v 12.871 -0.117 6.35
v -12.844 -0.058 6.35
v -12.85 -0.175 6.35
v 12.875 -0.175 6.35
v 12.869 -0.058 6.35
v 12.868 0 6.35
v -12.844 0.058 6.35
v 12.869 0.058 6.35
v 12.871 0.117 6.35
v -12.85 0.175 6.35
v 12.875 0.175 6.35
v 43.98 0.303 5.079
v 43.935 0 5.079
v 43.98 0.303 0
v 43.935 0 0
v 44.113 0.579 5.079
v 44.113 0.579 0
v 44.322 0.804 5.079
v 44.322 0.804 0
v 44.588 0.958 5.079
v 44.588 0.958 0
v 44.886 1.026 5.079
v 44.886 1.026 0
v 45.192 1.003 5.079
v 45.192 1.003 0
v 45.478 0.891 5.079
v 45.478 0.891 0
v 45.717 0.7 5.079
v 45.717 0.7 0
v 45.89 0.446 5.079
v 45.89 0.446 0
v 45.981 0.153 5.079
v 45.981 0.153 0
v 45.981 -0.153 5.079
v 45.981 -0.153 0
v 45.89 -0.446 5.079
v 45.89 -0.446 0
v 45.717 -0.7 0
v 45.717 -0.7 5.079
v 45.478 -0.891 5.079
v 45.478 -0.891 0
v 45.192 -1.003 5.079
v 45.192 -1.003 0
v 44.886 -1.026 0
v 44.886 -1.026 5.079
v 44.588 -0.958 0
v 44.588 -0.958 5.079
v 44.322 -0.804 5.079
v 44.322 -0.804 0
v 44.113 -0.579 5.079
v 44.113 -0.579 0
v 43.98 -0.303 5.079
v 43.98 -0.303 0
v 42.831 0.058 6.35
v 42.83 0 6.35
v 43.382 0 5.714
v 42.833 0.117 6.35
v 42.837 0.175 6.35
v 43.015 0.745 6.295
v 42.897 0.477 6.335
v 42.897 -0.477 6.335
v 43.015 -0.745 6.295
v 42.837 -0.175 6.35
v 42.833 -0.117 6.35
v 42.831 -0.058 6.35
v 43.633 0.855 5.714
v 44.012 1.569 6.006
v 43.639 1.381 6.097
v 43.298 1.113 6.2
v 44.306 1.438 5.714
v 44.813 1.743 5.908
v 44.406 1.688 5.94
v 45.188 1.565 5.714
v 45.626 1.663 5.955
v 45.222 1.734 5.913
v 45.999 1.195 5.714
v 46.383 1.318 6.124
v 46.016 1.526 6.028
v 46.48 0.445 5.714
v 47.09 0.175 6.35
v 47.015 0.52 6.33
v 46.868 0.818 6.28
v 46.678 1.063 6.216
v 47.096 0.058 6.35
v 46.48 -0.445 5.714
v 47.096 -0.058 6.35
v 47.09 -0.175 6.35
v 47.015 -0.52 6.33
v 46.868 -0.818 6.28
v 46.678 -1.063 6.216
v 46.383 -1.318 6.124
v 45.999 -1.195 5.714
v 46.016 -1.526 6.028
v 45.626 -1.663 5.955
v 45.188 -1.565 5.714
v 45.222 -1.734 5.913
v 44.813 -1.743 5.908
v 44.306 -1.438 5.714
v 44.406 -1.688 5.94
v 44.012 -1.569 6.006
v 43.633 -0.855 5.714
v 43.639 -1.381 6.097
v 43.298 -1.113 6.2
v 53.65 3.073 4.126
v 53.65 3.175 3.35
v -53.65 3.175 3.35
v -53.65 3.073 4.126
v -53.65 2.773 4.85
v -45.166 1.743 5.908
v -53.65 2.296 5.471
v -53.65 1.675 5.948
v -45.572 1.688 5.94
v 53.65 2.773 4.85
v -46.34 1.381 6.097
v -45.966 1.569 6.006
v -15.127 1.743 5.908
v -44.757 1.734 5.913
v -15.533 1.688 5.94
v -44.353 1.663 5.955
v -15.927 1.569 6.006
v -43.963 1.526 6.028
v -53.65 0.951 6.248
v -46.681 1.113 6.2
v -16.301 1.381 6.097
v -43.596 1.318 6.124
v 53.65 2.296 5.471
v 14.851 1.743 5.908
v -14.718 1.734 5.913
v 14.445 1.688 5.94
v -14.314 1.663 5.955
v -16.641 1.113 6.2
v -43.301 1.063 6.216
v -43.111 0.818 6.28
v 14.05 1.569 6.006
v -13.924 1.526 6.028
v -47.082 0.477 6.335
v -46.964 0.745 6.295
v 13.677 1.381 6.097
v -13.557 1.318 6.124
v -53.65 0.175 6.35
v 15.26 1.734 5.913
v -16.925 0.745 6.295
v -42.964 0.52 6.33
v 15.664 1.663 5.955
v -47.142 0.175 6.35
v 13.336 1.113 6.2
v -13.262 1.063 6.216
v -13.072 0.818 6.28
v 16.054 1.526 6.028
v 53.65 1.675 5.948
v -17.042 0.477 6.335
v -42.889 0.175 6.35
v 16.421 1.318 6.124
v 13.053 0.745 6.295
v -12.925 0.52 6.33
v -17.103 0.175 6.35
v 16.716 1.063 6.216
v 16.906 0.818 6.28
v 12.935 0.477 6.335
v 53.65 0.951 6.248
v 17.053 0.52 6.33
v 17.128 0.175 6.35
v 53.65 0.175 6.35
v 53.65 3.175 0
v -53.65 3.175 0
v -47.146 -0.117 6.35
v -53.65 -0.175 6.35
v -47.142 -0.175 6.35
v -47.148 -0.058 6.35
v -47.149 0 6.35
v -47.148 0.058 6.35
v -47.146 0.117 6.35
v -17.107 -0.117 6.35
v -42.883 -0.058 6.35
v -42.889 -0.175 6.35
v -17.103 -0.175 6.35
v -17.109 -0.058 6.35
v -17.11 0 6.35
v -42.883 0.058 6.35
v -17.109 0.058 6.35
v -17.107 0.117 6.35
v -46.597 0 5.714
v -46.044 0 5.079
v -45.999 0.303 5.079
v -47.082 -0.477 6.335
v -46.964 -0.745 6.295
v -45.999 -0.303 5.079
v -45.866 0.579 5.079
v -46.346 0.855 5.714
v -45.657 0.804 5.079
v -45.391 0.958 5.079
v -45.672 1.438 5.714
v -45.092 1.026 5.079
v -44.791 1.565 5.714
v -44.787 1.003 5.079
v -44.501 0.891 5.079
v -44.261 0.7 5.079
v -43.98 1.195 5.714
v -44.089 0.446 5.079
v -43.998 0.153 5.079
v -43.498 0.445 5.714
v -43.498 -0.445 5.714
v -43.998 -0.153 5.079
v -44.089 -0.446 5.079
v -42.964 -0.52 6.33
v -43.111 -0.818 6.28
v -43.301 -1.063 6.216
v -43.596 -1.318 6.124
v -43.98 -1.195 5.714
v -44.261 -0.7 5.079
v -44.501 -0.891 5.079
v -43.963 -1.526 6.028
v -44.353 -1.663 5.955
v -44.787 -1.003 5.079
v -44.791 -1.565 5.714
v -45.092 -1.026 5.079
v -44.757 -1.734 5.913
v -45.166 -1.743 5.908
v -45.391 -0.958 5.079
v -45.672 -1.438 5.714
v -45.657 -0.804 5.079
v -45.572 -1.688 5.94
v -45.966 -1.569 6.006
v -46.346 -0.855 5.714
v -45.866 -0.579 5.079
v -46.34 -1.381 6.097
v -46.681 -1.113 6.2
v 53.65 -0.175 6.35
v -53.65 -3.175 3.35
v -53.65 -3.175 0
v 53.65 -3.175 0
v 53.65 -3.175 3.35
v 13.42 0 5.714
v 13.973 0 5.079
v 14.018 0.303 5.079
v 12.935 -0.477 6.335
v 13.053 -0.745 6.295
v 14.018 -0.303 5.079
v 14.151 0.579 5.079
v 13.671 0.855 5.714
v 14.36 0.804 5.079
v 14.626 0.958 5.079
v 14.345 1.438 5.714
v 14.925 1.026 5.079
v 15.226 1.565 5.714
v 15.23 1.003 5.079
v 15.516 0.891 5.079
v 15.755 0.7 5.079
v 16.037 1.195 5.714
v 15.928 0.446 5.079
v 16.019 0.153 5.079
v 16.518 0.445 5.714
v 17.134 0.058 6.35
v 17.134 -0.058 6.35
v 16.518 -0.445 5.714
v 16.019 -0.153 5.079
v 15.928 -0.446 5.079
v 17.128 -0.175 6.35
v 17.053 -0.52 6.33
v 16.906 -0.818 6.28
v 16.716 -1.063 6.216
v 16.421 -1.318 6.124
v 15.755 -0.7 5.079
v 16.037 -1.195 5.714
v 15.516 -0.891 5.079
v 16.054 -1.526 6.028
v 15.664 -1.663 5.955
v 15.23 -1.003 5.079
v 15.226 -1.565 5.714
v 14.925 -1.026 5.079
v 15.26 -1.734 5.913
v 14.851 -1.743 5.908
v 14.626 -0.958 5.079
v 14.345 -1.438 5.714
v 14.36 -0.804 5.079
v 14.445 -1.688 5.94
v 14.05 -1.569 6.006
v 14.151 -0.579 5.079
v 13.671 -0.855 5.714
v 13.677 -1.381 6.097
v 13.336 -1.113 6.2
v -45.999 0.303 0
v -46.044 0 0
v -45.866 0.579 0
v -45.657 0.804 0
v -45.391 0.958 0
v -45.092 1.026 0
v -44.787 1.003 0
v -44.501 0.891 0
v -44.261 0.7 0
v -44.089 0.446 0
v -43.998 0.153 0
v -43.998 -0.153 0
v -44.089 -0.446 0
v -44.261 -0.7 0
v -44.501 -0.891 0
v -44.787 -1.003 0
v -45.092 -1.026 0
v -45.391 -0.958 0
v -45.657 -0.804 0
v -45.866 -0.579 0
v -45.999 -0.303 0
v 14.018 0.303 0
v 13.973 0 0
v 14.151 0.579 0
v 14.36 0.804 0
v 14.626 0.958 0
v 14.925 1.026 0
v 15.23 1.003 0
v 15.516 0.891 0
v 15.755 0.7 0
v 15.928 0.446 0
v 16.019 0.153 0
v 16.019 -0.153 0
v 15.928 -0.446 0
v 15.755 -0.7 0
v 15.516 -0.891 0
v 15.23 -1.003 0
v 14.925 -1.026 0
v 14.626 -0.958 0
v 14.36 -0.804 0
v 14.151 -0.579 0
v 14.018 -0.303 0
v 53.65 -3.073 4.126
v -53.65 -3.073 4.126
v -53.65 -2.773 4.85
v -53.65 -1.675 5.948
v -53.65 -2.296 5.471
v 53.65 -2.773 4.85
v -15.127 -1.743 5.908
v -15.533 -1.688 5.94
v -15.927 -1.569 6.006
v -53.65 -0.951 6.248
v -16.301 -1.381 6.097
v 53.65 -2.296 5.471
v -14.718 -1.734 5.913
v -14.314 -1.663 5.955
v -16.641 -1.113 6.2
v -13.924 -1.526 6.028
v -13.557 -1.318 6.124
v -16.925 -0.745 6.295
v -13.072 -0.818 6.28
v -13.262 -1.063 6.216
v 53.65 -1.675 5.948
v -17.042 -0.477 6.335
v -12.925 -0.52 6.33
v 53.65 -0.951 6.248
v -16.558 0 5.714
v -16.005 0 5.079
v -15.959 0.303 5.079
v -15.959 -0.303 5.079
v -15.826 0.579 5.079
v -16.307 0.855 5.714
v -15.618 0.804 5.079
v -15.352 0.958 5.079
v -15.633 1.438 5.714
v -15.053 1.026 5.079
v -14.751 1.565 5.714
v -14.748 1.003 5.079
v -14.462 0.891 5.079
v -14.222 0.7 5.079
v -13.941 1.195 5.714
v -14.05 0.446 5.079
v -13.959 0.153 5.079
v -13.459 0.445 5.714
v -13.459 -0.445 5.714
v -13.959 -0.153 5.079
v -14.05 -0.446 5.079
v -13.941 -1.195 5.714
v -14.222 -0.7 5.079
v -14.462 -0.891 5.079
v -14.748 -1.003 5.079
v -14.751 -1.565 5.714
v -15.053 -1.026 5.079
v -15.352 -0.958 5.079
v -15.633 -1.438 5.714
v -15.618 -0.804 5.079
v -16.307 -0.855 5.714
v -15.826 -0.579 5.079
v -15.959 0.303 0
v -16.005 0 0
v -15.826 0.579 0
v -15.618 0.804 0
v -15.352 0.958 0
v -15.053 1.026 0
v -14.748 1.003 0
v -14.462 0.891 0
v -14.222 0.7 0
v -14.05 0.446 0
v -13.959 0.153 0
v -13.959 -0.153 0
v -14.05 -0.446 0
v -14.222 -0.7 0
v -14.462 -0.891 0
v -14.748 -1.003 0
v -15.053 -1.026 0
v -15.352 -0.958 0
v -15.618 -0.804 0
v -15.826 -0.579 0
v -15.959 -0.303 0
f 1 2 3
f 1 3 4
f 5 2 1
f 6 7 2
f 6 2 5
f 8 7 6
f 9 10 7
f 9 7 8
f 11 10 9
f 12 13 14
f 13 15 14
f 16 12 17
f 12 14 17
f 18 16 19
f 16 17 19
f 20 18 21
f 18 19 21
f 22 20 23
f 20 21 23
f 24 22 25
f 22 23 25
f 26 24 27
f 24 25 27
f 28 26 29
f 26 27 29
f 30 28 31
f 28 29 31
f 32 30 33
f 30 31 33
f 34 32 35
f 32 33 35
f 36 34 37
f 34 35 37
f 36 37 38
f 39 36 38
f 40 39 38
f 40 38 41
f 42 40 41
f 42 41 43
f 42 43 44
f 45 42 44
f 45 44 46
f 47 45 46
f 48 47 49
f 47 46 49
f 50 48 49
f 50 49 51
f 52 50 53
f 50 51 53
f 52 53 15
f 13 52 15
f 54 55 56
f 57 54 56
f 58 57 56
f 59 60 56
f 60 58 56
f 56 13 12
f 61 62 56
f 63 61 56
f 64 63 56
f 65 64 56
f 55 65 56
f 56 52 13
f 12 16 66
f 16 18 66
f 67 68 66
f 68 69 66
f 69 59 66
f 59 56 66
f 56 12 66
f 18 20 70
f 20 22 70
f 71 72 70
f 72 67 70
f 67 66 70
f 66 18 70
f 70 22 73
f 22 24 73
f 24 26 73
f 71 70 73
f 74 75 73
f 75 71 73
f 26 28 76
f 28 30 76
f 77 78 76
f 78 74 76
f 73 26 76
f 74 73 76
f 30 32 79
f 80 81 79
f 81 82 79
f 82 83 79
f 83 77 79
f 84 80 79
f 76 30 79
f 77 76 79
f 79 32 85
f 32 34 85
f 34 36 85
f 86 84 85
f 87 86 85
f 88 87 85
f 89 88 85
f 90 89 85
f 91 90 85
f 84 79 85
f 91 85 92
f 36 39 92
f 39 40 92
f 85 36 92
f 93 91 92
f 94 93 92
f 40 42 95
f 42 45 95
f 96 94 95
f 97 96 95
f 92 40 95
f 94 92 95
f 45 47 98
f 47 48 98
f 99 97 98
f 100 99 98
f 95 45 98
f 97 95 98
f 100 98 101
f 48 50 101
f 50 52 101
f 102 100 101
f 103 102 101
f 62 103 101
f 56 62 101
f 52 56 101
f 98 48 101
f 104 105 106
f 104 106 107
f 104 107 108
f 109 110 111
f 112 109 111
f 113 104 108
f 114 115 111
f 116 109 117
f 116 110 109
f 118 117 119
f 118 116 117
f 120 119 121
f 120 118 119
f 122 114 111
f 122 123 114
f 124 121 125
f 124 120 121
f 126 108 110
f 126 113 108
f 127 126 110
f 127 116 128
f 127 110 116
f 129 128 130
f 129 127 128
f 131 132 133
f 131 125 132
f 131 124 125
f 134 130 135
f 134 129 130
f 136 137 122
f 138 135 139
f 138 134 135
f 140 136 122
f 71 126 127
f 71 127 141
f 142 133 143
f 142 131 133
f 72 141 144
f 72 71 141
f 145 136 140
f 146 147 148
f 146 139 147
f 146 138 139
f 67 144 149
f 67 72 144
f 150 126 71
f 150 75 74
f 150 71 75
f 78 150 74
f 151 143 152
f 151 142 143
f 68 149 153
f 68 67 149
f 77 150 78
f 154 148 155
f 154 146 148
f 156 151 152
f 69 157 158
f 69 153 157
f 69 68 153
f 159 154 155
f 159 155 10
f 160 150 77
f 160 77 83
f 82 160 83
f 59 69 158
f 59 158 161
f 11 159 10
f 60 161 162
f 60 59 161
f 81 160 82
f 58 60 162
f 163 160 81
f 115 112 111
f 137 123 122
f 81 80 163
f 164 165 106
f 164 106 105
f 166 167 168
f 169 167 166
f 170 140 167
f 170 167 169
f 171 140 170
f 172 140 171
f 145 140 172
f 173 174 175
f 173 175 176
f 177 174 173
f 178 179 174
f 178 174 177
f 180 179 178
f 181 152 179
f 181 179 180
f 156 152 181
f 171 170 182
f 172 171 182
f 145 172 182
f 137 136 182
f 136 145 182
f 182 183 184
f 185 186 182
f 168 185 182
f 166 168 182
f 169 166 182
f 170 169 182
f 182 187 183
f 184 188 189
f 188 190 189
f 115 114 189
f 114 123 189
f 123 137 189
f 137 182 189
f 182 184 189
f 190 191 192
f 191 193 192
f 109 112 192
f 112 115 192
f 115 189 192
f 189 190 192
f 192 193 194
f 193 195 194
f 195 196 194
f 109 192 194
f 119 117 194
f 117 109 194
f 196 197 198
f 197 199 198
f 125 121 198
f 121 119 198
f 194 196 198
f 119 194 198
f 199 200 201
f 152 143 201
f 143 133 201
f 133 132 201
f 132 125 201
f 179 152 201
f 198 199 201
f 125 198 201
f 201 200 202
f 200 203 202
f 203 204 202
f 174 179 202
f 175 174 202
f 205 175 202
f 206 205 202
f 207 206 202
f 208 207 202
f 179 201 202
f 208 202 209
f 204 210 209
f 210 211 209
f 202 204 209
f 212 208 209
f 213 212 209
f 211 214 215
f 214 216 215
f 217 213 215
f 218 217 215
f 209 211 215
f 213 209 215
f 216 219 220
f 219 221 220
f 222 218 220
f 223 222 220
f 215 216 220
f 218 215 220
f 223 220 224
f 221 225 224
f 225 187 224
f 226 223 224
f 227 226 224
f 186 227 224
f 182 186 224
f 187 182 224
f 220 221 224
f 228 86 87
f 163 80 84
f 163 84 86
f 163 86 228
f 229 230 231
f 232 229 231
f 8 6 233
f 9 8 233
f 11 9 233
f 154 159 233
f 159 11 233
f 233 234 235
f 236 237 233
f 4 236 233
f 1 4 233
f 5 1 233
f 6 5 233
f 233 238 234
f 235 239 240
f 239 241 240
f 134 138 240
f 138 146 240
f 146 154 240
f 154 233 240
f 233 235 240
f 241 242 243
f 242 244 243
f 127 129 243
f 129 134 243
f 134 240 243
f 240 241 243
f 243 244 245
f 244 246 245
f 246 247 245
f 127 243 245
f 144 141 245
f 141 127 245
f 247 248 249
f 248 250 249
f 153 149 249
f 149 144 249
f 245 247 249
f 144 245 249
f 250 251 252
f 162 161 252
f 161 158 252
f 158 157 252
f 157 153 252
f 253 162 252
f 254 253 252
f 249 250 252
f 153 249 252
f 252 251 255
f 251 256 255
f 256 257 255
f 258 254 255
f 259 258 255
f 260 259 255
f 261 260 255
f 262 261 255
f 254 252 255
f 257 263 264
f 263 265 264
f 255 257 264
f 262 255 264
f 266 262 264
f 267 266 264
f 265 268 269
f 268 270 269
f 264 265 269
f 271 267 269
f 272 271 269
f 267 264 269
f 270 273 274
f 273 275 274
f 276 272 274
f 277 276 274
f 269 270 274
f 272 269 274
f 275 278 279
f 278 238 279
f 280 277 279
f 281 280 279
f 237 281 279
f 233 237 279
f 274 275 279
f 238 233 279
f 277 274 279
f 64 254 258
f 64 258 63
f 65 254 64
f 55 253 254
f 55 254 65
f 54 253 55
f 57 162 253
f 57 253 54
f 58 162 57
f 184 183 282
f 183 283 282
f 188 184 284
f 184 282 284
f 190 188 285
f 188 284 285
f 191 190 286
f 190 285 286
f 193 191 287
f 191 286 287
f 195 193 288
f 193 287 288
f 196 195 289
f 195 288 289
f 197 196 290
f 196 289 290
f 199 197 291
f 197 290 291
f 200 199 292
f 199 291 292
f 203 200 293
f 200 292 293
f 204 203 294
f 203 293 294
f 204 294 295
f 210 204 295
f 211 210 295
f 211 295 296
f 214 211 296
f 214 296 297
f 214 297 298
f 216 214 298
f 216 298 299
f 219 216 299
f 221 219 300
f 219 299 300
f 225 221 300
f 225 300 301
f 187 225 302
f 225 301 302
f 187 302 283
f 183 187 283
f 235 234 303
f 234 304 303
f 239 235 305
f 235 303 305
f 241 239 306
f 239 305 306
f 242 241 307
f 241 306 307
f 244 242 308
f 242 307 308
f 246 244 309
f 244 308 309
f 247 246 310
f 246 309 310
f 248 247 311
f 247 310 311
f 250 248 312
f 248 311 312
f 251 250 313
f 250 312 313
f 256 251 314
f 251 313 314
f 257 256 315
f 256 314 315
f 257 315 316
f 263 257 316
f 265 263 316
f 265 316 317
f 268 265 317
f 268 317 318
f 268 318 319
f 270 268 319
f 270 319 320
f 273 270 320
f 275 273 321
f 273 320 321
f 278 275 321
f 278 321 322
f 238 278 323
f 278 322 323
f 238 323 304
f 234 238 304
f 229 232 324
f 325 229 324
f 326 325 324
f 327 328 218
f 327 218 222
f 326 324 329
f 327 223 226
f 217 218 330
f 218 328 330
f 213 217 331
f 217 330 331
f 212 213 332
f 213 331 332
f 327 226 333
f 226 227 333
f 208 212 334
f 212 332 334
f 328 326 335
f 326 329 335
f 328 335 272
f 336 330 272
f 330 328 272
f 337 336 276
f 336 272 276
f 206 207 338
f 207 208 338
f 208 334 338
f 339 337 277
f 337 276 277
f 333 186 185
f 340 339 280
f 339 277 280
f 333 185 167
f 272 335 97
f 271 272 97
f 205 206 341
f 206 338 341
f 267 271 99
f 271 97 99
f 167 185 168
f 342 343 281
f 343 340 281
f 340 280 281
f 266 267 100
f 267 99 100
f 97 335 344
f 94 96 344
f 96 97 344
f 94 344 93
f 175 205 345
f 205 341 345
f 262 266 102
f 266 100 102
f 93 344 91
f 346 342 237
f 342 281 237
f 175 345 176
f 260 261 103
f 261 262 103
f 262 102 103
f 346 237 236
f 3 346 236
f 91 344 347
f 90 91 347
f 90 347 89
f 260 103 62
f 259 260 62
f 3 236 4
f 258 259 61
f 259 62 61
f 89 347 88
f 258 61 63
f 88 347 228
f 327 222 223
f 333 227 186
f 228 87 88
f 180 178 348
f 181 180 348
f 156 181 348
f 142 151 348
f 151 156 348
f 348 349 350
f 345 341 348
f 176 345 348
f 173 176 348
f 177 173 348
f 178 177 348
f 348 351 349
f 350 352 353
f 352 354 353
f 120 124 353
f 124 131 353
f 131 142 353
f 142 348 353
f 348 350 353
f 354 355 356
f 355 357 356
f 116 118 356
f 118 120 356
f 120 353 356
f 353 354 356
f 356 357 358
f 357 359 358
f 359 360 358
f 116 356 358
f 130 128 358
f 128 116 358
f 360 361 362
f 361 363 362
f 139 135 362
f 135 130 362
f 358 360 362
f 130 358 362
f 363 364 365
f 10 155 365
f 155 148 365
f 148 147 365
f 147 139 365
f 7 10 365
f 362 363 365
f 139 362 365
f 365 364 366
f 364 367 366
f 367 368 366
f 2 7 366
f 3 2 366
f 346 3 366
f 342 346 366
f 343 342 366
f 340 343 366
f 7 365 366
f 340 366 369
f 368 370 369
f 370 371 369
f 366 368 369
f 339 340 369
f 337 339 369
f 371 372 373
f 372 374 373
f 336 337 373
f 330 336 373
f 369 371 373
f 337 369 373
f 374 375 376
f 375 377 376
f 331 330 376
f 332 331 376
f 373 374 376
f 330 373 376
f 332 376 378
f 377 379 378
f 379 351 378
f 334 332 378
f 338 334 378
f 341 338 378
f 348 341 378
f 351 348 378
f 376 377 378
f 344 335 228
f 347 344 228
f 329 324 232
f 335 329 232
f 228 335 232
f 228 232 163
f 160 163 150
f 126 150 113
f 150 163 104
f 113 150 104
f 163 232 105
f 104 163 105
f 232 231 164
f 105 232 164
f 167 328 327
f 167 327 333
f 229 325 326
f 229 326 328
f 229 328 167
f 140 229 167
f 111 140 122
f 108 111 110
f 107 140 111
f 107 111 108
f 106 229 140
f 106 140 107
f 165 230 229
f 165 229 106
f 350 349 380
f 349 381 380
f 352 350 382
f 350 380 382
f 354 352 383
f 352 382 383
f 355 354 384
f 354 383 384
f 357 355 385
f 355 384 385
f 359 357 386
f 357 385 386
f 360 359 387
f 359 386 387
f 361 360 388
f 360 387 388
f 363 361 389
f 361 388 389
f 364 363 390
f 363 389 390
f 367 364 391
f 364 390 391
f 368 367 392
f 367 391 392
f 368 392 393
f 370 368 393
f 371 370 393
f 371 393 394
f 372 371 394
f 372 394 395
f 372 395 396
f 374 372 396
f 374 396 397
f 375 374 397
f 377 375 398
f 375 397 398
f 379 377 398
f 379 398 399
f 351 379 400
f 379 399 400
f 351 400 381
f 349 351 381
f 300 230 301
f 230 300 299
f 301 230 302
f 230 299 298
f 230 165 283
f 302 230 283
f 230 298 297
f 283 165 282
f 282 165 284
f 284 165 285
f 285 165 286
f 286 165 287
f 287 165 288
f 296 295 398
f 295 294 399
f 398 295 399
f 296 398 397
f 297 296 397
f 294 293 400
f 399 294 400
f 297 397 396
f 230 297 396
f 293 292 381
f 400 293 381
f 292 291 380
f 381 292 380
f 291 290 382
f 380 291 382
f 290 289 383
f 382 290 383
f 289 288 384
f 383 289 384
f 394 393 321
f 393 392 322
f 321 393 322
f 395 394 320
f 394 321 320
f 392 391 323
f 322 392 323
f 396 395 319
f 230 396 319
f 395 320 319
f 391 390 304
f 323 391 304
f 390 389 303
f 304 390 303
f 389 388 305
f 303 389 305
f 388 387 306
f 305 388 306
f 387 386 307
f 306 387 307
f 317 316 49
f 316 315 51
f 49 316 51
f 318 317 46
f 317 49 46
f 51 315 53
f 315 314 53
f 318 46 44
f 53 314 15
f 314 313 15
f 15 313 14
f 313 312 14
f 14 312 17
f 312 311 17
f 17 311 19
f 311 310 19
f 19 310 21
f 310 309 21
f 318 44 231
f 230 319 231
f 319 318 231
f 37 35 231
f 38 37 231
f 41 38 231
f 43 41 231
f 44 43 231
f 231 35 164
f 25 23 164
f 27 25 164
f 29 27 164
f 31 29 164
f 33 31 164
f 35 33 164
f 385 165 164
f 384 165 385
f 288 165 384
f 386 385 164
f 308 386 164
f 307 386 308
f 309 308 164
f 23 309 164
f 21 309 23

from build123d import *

# Parameters (mm, degrees)
F0_W           = 107.3
F0_H           = 6.35
F1_DEPTH       = 6.35
F2_R           = 3
F4_D           = 2.0574
F4_CSINK_D     = 4.2672
F4_CSINK_ANGLE = 82


with BuildPart() as f1:
    # F0 (on Top) → F1 (new body)
    with BuildSketch(Plane.XY):
        Rectangle(F0_W, F0_H)
    extrude(amount=F1_DEPTH)

    # F2
    f2_edges = [f1.edges().sort_by_distance(p)[0] for p in [
        (0, 3.175, 6.35),
        (0, -3.175, 6.35),
    ]]
    fillet(f2_edges, radius=F2_R)

    # F4 (through all)
    with Locations(Plane.XY.offset(6.35)):
        with Locations((-14.9764604867, 0), (15.0013882667, 0), (44.9633300304, 0), (-45.0155586004, 0)):
            CounterSinkHole(F4_D / 2, F4_CSINK_D / 2, counter_sink_angle=F4_CSINK_ANGLE)


solid = f1.part
